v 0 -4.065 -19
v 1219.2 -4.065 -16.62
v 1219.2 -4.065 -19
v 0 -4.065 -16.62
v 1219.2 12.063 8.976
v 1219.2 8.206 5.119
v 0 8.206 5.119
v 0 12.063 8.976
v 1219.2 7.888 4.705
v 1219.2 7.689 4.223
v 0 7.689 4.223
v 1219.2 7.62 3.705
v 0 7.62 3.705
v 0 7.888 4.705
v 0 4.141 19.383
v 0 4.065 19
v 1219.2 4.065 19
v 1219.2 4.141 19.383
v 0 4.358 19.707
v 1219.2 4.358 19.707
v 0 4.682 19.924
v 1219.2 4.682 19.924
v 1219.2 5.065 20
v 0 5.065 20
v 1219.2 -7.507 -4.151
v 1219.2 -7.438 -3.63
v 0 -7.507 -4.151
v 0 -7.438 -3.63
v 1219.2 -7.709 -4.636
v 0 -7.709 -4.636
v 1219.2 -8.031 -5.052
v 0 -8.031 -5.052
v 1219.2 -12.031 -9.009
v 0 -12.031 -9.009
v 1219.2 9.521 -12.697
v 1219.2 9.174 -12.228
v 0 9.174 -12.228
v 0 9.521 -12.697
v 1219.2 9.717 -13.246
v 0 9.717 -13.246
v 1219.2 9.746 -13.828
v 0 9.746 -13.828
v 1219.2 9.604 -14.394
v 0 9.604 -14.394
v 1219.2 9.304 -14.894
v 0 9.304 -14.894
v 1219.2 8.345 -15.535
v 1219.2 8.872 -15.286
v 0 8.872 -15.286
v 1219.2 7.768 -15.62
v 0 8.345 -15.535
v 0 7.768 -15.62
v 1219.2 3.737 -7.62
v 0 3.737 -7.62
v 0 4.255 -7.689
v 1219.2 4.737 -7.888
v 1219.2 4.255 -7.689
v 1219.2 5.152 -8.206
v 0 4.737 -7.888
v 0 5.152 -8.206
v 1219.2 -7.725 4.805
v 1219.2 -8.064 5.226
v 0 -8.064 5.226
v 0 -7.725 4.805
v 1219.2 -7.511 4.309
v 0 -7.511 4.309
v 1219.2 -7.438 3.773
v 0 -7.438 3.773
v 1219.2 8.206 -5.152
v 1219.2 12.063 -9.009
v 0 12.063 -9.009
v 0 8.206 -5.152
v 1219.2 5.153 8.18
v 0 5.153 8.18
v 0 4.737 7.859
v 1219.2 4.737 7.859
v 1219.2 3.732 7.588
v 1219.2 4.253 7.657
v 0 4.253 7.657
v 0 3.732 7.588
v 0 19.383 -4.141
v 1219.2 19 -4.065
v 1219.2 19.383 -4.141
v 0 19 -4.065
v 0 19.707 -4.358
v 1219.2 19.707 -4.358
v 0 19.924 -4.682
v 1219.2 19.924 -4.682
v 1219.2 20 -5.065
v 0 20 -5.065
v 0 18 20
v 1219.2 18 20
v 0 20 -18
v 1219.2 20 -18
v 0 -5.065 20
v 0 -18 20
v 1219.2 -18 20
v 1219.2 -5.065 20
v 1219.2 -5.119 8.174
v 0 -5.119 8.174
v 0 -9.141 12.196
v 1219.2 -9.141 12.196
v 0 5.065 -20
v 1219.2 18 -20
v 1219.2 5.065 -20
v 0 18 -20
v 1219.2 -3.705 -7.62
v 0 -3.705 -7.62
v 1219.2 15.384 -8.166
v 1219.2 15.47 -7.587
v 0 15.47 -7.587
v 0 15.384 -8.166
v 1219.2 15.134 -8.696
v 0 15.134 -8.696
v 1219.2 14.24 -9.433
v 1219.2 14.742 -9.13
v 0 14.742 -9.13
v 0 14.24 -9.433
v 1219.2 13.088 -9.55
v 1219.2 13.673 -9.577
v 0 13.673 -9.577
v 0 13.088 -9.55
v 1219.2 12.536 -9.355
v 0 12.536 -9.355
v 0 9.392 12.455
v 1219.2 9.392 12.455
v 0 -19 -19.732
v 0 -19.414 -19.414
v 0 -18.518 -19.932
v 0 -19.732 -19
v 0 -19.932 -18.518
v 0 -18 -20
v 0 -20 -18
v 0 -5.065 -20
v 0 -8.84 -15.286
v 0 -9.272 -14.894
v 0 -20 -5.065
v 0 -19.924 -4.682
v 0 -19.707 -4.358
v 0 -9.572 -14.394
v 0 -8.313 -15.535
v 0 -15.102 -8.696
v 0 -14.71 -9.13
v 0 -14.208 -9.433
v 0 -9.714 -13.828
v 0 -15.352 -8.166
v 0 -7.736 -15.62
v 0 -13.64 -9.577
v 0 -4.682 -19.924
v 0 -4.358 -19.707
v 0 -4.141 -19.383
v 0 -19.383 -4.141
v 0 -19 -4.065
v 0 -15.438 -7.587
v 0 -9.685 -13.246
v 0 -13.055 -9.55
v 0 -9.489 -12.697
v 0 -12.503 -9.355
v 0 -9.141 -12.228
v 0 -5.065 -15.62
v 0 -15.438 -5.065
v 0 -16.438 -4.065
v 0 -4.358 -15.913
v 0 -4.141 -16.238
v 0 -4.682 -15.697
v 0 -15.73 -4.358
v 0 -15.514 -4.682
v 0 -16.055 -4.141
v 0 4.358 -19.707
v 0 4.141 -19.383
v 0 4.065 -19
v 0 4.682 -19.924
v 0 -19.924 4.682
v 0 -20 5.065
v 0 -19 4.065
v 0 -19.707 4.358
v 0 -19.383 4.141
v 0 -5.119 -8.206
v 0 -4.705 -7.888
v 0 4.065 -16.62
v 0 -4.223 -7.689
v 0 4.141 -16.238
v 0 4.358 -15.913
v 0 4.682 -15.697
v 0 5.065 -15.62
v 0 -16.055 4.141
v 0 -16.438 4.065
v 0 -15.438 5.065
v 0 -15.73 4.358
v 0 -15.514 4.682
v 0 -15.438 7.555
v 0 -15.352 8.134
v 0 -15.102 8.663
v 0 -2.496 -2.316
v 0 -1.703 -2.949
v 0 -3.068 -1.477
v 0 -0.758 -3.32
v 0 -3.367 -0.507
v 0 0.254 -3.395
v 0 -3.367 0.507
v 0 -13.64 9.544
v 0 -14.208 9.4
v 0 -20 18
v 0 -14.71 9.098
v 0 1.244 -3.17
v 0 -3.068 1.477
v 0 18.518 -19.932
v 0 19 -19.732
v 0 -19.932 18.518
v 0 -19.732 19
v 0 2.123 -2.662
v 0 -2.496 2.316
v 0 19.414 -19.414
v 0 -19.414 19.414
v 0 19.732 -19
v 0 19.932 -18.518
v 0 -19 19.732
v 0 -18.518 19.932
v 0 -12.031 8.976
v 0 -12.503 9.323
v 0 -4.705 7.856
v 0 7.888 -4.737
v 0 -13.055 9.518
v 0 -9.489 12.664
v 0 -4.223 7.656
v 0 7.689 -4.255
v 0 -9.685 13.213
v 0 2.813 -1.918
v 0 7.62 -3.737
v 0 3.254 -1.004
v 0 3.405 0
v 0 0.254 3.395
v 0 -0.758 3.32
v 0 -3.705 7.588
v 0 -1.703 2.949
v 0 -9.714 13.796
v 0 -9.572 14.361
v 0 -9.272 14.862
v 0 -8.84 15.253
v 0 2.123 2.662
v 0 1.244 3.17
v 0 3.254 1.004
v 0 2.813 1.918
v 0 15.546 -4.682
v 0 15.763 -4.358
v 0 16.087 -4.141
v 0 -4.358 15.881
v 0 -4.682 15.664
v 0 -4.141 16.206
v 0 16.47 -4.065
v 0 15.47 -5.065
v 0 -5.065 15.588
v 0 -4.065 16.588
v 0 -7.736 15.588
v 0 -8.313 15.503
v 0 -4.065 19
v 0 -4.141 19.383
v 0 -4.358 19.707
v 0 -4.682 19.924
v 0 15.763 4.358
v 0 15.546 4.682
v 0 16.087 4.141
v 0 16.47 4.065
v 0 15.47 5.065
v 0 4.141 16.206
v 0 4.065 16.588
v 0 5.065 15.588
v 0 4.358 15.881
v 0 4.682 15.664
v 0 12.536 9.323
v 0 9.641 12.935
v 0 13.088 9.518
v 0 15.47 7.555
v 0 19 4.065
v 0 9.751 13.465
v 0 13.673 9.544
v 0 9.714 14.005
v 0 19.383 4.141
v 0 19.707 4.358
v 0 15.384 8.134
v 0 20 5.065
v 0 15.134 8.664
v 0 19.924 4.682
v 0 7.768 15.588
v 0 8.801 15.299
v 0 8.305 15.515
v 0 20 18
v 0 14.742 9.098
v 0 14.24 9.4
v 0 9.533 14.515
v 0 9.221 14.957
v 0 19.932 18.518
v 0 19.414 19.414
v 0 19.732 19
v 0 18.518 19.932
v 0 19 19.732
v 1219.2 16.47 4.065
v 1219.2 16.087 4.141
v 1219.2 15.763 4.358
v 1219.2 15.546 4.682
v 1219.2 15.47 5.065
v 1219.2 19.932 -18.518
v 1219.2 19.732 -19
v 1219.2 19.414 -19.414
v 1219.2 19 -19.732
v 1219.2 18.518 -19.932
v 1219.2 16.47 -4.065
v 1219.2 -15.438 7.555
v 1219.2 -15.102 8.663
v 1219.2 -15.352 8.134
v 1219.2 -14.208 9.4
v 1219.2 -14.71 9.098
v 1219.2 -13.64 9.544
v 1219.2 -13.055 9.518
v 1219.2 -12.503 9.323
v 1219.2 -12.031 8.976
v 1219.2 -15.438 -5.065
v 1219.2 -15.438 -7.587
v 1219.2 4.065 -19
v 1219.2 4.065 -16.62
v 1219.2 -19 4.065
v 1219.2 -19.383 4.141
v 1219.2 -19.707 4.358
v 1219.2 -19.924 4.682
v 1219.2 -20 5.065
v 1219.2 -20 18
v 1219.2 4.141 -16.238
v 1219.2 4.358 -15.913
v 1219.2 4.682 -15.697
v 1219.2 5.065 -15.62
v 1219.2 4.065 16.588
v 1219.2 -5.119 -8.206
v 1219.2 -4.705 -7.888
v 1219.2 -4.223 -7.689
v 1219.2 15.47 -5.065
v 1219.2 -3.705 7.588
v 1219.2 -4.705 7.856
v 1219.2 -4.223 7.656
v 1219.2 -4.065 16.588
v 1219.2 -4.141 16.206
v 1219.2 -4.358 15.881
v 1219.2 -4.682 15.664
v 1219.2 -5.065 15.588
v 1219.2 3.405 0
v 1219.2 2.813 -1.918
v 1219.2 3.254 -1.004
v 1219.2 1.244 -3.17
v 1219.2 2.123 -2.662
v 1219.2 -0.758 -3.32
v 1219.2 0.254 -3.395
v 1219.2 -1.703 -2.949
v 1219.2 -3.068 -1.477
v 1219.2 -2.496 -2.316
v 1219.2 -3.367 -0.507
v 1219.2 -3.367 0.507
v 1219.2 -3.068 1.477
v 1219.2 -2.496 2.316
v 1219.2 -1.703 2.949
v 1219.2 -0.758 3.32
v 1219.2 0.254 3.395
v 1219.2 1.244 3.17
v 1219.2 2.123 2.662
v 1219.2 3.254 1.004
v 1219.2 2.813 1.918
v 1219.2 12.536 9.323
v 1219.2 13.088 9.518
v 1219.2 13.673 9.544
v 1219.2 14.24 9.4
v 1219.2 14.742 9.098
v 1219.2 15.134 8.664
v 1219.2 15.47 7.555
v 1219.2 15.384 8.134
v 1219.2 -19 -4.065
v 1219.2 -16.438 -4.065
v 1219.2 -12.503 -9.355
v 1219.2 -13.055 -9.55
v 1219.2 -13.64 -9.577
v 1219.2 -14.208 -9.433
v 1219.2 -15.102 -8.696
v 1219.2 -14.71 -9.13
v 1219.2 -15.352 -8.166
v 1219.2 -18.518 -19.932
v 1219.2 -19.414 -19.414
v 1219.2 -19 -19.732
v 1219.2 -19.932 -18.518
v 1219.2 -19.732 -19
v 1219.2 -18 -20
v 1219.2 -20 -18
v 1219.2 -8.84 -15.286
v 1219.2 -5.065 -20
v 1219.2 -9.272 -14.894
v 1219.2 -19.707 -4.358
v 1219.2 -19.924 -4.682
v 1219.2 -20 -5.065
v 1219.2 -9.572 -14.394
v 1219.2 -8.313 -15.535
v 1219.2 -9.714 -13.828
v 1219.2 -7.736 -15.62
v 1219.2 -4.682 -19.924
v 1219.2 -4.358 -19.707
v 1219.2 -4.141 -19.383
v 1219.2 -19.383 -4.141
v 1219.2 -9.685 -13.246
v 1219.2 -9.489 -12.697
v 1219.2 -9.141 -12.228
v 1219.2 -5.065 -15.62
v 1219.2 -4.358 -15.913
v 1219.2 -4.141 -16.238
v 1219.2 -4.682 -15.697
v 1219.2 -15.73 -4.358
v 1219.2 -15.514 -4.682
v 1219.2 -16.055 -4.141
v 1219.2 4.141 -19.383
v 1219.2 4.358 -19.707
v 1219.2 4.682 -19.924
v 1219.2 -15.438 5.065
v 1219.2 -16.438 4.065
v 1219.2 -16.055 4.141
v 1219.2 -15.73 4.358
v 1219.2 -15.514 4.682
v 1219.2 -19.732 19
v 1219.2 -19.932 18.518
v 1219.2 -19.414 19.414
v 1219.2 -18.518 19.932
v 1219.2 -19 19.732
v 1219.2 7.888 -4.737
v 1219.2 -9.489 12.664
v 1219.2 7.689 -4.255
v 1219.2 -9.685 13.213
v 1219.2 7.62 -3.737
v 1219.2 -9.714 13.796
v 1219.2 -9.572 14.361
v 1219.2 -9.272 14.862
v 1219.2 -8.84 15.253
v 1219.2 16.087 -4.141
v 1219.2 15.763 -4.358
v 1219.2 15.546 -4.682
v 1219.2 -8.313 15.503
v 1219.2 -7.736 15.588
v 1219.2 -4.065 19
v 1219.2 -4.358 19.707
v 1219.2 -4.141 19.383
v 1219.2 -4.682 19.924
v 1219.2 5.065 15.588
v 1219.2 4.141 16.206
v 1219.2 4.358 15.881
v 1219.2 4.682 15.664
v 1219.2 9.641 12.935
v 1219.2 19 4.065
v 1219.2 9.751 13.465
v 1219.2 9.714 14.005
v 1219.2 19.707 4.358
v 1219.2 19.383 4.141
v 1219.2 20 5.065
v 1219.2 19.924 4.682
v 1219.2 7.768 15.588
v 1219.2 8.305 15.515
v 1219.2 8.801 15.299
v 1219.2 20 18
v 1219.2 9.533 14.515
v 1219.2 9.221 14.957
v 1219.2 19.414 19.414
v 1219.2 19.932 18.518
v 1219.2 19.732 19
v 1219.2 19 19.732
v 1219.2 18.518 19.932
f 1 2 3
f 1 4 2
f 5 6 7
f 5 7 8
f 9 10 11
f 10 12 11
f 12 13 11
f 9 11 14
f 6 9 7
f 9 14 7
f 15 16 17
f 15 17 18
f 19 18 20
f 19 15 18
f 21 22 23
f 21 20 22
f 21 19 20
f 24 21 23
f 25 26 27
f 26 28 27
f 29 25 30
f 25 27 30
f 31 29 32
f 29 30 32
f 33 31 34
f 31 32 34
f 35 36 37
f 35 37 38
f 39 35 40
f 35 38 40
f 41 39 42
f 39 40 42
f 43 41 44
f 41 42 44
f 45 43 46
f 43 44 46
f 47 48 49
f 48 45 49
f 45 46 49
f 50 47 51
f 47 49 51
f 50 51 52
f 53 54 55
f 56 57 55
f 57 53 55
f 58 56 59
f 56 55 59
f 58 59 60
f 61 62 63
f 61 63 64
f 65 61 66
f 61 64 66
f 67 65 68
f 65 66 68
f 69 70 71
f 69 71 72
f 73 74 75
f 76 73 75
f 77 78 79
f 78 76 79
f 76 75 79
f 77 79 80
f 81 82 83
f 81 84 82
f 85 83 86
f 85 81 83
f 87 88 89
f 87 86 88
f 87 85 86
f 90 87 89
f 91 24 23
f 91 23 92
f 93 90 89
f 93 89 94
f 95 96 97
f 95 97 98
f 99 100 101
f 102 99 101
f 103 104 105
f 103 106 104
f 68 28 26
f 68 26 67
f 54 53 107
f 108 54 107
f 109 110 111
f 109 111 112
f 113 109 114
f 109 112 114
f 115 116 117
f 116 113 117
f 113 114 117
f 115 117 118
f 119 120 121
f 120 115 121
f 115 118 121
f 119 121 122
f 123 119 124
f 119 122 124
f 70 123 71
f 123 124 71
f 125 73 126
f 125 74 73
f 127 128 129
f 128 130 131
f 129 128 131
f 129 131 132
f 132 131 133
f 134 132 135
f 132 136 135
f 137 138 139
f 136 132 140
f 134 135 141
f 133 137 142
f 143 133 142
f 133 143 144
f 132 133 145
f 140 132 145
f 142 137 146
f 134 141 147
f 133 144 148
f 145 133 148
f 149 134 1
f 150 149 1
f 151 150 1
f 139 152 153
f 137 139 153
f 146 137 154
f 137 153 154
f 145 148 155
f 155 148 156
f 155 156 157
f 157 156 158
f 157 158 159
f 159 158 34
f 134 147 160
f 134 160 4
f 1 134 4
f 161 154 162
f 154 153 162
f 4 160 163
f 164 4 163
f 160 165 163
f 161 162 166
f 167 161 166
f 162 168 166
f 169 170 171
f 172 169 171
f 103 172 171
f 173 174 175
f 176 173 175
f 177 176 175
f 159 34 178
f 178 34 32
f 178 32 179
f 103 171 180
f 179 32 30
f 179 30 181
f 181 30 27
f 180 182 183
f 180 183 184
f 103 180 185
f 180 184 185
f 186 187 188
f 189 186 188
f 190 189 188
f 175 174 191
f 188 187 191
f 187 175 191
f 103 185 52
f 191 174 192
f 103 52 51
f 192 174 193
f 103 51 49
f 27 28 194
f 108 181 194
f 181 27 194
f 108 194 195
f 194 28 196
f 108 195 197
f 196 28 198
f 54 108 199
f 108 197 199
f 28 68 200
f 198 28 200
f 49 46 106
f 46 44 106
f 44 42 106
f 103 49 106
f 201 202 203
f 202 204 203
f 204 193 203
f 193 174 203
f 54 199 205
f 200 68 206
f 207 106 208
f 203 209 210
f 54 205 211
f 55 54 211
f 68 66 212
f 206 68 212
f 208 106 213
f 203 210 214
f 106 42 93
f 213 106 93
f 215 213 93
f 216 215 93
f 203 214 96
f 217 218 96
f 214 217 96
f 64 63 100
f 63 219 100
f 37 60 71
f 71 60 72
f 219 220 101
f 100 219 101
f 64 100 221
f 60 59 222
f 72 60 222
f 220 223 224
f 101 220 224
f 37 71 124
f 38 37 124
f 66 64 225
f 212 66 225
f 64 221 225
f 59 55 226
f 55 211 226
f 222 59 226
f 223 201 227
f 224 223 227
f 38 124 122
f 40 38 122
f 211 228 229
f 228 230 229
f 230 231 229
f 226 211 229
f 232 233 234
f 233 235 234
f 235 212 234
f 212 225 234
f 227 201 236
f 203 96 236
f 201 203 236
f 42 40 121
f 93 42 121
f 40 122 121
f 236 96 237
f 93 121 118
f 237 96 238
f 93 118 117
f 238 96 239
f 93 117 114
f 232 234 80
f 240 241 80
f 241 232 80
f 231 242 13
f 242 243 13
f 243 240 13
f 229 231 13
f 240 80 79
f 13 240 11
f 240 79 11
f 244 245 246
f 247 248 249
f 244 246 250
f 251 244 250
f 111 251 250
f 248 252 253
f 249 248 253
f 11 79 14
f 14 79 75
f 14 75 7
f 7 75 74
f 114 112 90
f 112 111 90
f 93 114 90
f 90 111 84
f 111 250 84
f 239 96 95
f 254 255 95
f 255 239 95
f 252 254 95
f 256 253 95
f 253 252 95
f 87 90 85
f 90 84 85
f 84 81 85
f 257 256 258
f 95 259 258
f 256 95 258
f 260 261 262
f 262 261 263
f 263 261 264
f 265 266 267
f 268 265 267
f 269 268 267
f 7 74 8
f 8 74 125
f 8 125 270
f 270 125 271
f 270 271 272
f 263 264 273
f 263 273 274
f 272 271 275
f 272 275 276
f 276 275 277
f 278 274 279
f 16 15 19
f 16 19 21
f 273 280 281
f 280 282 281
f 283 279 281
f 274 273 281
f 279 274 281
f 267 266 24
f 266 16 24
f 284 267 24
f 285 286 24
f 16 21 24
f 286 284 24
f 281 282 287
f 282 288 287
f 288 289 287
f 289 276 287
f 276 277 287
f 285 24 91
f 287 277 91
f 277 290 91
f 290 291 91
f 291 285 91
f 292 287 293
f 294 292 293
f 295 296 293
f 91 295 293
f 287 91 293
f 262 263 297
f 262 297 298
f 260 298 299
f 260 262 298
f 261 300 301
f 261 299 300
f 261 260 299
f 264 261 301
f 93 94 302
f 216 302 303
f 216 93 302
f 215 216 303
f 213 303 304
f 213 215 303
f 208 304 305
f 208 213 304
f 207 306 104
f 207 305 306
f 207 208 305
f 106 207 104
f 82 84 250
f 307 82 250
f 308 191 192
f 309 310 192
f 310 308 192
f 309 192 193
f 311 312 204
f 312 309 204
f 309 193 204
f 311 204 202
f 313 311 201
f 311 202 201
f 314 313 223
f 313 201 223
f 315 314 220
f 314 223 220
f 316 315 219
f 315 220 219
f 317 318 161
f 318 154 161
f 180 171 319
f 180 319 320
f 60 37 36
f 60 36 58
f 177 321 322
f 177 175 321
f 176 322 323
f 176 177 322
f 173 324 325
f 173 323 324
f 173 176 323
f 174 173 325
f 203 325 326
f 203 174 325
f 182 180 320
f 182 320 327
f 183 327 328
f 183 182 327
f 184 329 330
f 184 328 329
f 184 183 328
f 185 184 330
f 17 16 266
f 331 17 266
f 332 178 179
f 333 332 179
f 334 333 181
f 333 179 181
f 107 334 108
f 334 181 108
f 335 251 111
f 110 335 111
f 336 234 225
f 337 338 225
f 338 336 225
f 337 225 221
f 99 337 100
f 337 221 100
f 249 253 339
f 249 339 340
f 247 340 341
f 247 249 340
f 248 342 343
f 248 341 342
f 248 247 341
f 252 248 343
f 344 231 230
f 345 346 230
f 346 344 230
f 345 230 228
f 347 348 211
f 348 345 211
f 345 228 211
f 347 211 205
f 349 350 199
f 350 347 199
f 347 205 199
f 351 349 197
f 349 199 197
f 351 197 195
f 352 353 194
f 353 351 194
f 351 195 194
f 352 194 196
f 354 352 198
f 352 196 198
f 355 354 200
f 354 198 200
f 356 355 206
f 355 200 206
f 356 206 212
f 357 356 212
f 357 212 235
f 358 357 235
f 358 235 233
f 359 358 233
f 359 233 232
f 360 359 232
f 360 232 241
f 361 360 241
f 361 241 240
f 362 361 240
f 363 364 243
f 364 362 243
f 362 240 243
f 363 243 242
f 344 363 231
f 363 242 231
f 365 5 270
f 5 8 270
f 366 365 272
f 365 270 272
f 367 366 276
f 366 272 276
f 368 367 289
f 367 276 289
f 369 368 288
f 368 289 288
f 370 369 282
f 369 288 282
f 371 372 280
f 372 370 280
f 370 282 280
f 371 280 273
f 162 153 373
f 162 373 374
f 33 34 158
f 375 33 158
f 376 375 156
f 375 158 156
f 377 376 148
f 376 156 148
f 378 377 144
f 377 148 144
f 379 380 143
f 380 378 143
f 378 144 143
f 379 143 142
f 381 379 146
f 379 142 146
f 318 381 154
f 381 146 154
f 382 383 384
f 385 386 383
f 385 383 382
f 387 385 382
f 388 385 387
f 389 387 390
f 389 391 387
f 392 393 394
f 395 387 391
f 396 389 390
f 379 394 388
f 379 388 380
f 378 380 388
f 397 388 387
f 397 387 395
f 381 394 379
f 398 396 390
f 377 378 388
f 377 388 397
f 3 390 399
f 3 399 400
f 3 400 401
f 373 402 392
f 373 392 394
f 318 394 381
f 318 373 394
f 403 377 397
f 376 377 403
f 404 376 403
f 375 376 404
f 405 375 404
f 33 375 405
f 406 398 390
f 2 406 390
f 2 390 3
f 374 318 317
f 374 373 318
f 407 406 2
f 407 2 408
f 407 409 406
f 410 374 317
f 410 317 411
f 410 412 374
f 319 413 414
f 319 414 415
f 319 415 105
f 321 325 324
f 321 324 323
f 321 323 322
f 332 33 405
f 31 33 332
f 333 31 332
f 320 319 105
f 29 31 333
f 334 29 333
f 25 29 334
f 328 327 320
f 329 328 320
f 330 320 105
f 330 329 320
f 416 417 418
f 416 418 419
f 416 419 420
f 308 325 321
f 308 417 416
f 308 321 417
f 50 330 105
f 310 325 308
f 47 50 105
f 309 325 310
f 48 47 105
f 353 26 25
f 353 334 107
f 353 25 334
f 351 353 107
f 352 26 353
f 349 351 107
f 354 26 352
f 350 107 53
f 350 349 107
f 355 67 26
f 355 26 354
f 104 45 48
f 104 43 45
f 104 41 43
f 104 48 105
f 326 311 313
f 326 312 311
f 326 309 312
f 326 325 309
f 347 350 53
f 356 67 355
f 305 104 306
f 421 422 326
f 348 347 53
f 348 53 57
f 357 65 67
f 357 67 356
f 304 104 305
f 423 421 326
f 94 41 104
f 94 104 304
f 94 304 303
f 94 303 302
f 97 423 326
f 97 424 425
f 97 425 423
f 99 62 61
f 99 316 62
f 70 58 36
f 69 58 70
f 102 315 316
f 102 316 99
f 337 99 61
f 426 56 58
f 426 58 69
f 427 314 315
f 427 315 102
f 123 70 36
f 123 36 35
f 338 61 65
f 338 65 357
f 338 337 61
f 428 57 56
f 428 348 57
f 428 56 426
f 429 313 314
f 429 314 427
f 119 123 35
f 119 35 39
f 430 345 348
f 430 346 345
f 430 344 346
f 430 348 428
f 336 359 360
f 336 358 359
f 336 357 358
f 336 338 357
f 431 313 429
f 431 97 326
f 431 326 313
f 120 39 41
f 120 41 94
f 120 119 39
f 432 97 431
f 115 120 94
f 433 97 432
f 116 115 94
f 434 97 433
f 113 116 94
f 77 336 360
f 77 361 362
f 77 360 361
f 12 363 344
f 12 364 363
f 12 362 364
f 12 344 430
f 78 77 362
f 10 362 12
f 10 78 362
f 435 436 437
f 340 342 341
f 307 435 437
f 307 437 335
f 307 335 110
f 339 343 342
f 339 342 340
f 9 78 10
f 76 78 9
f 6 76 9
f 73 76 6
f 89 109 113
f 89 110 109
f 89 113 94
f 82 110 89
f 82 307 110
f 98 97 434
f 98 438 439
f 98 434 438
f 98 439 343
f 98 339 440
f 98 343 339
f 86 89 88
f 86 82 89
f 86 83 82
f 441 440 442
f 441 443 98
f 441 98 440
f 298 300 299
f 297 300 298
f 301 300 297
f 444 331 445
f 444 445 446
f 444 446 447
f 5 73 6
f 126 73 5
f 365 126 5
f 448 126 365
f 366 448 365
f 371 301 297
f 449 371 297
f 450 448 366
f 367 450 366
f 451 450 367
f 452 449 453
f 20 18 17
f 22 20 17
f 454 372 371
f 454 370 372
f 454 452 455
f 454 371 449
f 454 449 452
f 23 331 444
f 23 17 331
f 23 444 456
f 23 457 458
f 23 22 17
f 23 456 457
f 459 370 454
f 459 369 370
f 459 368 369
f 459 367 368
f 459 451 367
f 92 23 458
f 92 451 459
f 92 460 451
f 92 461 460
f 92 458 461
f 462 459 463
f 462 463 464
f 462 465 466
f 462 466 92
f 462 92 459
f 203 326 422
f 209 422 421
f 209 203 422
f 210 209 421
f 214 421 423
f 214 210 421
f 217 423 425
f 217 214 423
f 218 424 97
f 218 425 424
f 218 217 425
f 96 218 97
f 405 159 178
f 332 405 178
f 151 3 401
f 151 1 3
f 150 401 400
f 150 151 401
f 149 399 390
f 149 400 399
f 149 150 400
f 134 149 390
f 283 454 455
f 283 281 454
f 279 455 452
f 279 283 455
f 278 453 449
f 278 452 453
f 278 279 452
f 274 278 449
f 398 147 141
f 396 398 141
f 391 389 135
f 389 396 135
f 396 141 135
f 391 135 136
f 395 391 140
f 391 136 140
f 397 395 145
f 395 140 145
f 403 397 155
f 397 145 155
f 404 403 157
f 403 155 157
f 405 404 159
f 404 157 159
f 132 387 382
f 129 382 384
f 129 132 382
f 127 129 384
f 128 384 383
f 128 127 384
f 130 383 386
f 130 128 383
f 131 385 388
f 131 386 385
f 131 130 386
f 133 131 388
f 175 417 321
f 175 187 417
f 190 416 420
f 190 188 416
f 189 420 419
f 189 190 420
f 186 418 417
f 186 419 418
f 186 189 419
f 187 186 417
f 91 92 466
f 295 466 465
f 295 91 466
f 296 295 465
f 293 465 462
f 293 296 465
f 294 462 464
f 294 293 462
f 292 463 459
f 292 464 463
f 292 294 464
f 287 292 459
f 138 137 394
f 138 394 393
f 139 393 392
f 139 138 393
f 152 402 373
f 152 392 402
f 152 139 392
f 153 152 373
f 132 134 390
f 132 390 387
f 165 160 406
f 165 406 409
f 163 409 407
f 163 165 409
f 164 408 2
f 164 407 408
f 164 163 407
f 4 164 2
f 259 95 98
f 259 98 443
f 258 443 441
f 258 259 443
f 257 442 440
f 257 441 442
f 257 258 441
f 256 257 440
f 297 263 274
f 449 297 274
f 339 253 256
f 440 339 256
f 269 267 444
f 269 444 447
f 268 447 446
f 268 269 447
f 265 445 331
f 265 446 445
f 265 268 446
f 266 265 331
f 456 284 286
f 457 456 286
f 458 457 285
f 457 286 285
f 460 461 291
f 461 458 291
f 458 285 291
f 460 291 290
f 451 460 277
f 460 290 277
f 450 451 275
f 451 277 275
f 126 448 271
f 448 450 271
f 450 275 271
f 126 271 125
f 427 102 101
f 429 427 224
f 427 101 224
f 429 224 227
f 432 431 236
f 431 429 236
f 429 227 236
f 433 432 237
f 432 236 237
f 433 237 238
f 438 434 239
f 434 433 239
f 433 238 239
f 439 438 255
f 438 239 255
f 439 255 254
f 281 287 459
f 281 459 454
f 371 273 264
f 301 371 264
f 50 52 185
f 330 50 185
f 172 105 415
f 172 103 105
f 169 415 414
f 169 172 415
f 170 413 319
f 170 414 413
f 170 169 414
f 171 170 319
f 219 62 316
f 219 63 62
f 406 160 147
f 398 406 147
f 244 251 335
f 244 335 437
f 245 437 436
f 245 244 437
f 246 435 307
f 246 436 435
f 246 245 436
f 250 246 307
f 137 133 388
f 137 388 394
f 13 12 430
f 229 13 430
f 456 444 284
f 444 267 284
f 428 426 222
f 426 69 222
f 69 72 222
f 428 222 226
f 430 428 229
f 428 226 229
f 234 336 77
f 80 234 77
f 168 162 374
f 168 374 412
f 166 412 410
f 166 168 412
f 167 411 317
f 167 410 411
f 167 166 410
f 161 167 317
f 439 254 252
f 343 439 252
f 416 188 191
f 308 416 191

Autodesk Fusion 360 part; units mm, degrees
sketch "Sketch1" plane through (0, 0, 0) normal (1, 0, 0) x (0, 1, 0)
  circle A0 centre (0, 0) radius 3.405
  line L0 (3.7374, -7.6205) -> (-3.7051, -7.6205)
  line L1 (-3.7051, 7.5882) -> (3.7325, 7.5882)
  line L2 (7.425, -7.6205) -> (-7.425, 7.6205) construction
  line L3 (-7.425, -7.6205) -> (2.3762, 2.4388) construction
  line L4 (20, -20) -> (-20, 20) construction
  line L5 (15.425, -15.6205) -> (-15.425, 15.6205) construction
  line L6 (-8.0311, -5.0519) -> (-12.0311, -9.0087)
  line L7 (16.9453, -20) -> (68.4291, -20) construction
  line L8 (5.1526, 8.18) -> (9.3917, 12.4549)
  line L9 (-5.1193, 8.174) -> (-9.1412, 12.1959)
  line L10 (12.0634, -9.0087) -> (8.2063, -5.1516)
  line L11 (8.2063, 5.1193) -> (12.0634, 8.9764)
  line L12 (-9.1412, -12.2283) -> (-5.1193, -8.2063)
  line L13 (9.1735, -12.2283) -> (5.1516, -8.2063)
  line L14 (-8.0638, 5.2264) -> (-12.0311, 8.9764)
  line L15 (-20, -20) -> (2.4077, 2.4077) construction
  line L16 (7.425, 7.425) -> (20, 20) construction
  line L17 (-15.425, -15.6205) -> (2.3925, 2.4228) construction
  line L18 (7.6205, 3.7051) -> (7.6205, -3.7374)
  line L19 (-7.4376, -3.6301) -> (-7.4376, 3.7729)
  line L20 (-19, -4.065) -> (-16.4376, -4.065)
  line L21 (-16.4376, 4.065) -> (-19, 4.065)
  line L22 (16.47, 4.065) -> (19, 4.065)
  line L23 (19, -4.065) -> (16.47, -4.065)
  line L24 (-20, -18) -> (-20, -5.065)
  line L25 (-20, 5.065) -> (-20, 18)
  line L26 (-15.4376, -7.5869) -> (-15.4376, -5.065)
  line L27 (-15.4376, 5.065) -> (-15.4376, 7.5546)
  line L28 (15.47, 7.5546) -> (15.47, 5.065)
  line L29 (15.47, -5.065) -> (15.47, -7.5869)
  line L30 (20, 18) -> (20, 5.065)
  line L31 (20, -5.065) -> (20, -18)
  line L32 (16.47, 4.065) -> (19, 4.065)
  line L33 (4.065, 19) -> (4.065, 16.5882)
  line L34 (-4.065, 16.5882) -> (-4.065, 19)
  line L35 (4.065, -19) -> (4.065, -16.6205)
  line L36 (-4.065, -16.6205) -> (-4.065, -19)
  line L37 (-7.7361, 15.5882) -> (-5.065, 15.5882)
  line L38 (5.065, 15.5882) -> (7.7684, 15.5882)
  line L39 (-18, 20) -> (-5.065, 20)
  line L40 (5.065, 20) -> (18, 20)
  line L41 (-16.9453, -20) -> (-5.065, -20) construction
  line L42 (5.065, -20) -> (34.3692, -20) construction
  line L43 (18, -20) -> (4.065, -20)
  line L44 (-4.065, -20) -> (-18, -20)
  line L45 (7.7684, -15.6205) -> (5.065, -15.6205)
  line L46 (-5.065, -15.6205) -> (-7.7361, -15.6205)
  arc A1 (-18, 20) -> (-20, 18) centre (-18, 18) ccw
  arc A2 (20, 18) -> (18, 20) centre (18, 18) ccw
  arc A3 (18, -20) -> (20, -18) centre (18, -18) ccw
  arc A4 (-20, -18) -> (-18, -20) centre (-18, -18) ccw
  arc A5 (-9.1412, -12.2283) -> (-7.7361, -15.6205) centre (-7.7361, -13.6334) ccw
  arc A6 (-15.4376, -7.5869) -> (-12.0311, -9.0087) centre (-13.4376, -7.5869) ccw
  arc A7 (7.7684, -15.6205) -> (9.1735, -12.2283) centre (7.7684, -13.6334) ccw
  arc A8 (12.0634, -9.0087) -> (15.47, -7.5869) centre (13.47, -7.5869) ccw
  arc A9 (-12.0311, 8.9764) -> (-15.4376, 7.5546) centre (-13.4376, 7.5546) ccw
  arc A10 (-7.7361, 15.5882) -> (-9.1412, 12.1959) centre (-7.7361, 13.6011) ccw
  arc A11 (9.1735, 12.1959) -> (7.7684, 15.5882) centre (7.7684, 13.6011) ccw
  arc A12 (15.47, 7.5546) -> (12.0634, 8.9764) centre (13.47, 7.5546) ccw
  arc A13 (16.47, -4.065) -> (15.47, -5.065) centre (16.47, -5.065) ccw
  arc A14 (20, -5.065) -> (19, -4.065) centre (19, -5.065) ccw
  arc A15 (5.065, -15.6205) -> (4.065, -16.6205) centre (5.065, -16.6205) ccw
  arc A16 (4.065, -19) -> (5.065, -20) centre (5.065, -19) ccw
  arc A17 (-4.065, -16.6205) -> (-5.065, -15.6205) centre (-5.065, -16.6205) ccw
  arc A18 (-5.065, -20) -> (-4.065, -19) centre (-5.065, -19) ccw
  arc A19 (-19, -4.065) -> (-20, -5.065) centre (-19, -5.065) ccw
  arc A20 (-15.4376, -5.065) -> (-16.4376, -4.065) centre (-16.4376, -5.065) ccw
  arc A21 (-20, 5.065) -> (-19, 4.065) centre (-19, 5.065) ccw
  arc A22 (-16.4376, 4.065) -> (-15.4376, 5.065) centre (-16.4376, 5.065) ccw
  arc A23 (-4.065, 19) -> (-5.065, 20) centre (-5.065, 19) ccw
  arc A24 (-5.065, 15.5882) -> (-4.065, 16.5882) centre (-5.065, 16.5882) ccw
  arc A25 (4.065, 16.5882) -> (5.065, 15.5882) centre (5.065, 16.5882) ccw
  arc A26 (5.065, 20) -> (4.065, 19) centre (5.065, 19) ccw
  arc A27 (15.47, 5.065) -> (16.47, 4.065) centre (16.47, 5.065) ccw
  arc A28 (19, 4.065) -> (20, 5.065) centre (19, 5.065) ccw
  arc A29 (3.7325, 7.5882) -> (5.1526, 8.18) centre (3.7325, 9.5882) ccw
  arc A30 (8.2063, 5.1193) -> (7.6205, 3.7051) centre (9.6205, 3.7051) ccw
  arc A31 (7.6205, -3.7374) -> (8.2063, -5.1516) centre (9.6205, -3.7374) ccw
  arc A32 (5.1516, -8.2063) -> (3.7374, -7.6205) centre (3.7374, -9.6205) ccw
  arc A33 (-3.7051, -7.6205) -> (-5.1193, -8.2063) centre (-3.7051, -9.6205) ccw
  arc A34 (-8.0311, -5.0519) -> (-7.4376, -3.6301) centre (-9.4376, -3.6301) ccw
  arc A35 (-7.4376, 3.7729) -> (-8.0638, 5.2264) centre (-9.4376, 3.7729) ccw
  arc A36 (-5.1193, 8.174) -> (-3.7051, 7.5882) centre (-3.7051, 9.5882) ccw
  dimension "d1" = 6.81
  dimension "d4" = 40
  dimension "d5" = 40
  dimension "d7" = 8
  dimension "d9" = 45
  dimension "d11" = 135
  dimension "d12" = 4.32
  dimension "d13" = 2.16
  dimension "d16" = 8.13
  dimension "d17" = 2
  dimension "d18" = 2
  dimension "d19" = 2
  dimension "d20" = 2
  dimension "d22" = 2
  dimension "d23" = 8
  dimension "d24" = 8
  dimension "d26" = 1
  dimension "d27" = 1
  dimension "d28" = 1
  dimension "d29" = 1
  dimension "d30" = 1
  dimension "d31" = 1
  dimension "d32" = 1
  dimension "d33" = 1
  dimension "d34" = 1
  dimension "d35" = 1
  dimension "d36" = 1
  dimension "d37" = 1
  dimension "d38" = 1
  dimension "d39" = 1
  dimension "d40" = 1
  dimension "d41" = 1
  dimension "d42" = 8.13
  dimension "d43" = 8.13
  dimension "d44" = 8.13
  dimension "d45" = 2
  dimension "d46" = 2
  dimension "d47" = 2
  dimension "d48" = 2
  dimension "d49" = 2
  dimension "d50" = 2
  dimension "d51" = 2
  dimension "d52" = 2
extrude "Extrude1" add sketch "Sketch1" along normal blind 1219.2
equation "d13 = ( 4.32 / 2 ) * 1 mm"
